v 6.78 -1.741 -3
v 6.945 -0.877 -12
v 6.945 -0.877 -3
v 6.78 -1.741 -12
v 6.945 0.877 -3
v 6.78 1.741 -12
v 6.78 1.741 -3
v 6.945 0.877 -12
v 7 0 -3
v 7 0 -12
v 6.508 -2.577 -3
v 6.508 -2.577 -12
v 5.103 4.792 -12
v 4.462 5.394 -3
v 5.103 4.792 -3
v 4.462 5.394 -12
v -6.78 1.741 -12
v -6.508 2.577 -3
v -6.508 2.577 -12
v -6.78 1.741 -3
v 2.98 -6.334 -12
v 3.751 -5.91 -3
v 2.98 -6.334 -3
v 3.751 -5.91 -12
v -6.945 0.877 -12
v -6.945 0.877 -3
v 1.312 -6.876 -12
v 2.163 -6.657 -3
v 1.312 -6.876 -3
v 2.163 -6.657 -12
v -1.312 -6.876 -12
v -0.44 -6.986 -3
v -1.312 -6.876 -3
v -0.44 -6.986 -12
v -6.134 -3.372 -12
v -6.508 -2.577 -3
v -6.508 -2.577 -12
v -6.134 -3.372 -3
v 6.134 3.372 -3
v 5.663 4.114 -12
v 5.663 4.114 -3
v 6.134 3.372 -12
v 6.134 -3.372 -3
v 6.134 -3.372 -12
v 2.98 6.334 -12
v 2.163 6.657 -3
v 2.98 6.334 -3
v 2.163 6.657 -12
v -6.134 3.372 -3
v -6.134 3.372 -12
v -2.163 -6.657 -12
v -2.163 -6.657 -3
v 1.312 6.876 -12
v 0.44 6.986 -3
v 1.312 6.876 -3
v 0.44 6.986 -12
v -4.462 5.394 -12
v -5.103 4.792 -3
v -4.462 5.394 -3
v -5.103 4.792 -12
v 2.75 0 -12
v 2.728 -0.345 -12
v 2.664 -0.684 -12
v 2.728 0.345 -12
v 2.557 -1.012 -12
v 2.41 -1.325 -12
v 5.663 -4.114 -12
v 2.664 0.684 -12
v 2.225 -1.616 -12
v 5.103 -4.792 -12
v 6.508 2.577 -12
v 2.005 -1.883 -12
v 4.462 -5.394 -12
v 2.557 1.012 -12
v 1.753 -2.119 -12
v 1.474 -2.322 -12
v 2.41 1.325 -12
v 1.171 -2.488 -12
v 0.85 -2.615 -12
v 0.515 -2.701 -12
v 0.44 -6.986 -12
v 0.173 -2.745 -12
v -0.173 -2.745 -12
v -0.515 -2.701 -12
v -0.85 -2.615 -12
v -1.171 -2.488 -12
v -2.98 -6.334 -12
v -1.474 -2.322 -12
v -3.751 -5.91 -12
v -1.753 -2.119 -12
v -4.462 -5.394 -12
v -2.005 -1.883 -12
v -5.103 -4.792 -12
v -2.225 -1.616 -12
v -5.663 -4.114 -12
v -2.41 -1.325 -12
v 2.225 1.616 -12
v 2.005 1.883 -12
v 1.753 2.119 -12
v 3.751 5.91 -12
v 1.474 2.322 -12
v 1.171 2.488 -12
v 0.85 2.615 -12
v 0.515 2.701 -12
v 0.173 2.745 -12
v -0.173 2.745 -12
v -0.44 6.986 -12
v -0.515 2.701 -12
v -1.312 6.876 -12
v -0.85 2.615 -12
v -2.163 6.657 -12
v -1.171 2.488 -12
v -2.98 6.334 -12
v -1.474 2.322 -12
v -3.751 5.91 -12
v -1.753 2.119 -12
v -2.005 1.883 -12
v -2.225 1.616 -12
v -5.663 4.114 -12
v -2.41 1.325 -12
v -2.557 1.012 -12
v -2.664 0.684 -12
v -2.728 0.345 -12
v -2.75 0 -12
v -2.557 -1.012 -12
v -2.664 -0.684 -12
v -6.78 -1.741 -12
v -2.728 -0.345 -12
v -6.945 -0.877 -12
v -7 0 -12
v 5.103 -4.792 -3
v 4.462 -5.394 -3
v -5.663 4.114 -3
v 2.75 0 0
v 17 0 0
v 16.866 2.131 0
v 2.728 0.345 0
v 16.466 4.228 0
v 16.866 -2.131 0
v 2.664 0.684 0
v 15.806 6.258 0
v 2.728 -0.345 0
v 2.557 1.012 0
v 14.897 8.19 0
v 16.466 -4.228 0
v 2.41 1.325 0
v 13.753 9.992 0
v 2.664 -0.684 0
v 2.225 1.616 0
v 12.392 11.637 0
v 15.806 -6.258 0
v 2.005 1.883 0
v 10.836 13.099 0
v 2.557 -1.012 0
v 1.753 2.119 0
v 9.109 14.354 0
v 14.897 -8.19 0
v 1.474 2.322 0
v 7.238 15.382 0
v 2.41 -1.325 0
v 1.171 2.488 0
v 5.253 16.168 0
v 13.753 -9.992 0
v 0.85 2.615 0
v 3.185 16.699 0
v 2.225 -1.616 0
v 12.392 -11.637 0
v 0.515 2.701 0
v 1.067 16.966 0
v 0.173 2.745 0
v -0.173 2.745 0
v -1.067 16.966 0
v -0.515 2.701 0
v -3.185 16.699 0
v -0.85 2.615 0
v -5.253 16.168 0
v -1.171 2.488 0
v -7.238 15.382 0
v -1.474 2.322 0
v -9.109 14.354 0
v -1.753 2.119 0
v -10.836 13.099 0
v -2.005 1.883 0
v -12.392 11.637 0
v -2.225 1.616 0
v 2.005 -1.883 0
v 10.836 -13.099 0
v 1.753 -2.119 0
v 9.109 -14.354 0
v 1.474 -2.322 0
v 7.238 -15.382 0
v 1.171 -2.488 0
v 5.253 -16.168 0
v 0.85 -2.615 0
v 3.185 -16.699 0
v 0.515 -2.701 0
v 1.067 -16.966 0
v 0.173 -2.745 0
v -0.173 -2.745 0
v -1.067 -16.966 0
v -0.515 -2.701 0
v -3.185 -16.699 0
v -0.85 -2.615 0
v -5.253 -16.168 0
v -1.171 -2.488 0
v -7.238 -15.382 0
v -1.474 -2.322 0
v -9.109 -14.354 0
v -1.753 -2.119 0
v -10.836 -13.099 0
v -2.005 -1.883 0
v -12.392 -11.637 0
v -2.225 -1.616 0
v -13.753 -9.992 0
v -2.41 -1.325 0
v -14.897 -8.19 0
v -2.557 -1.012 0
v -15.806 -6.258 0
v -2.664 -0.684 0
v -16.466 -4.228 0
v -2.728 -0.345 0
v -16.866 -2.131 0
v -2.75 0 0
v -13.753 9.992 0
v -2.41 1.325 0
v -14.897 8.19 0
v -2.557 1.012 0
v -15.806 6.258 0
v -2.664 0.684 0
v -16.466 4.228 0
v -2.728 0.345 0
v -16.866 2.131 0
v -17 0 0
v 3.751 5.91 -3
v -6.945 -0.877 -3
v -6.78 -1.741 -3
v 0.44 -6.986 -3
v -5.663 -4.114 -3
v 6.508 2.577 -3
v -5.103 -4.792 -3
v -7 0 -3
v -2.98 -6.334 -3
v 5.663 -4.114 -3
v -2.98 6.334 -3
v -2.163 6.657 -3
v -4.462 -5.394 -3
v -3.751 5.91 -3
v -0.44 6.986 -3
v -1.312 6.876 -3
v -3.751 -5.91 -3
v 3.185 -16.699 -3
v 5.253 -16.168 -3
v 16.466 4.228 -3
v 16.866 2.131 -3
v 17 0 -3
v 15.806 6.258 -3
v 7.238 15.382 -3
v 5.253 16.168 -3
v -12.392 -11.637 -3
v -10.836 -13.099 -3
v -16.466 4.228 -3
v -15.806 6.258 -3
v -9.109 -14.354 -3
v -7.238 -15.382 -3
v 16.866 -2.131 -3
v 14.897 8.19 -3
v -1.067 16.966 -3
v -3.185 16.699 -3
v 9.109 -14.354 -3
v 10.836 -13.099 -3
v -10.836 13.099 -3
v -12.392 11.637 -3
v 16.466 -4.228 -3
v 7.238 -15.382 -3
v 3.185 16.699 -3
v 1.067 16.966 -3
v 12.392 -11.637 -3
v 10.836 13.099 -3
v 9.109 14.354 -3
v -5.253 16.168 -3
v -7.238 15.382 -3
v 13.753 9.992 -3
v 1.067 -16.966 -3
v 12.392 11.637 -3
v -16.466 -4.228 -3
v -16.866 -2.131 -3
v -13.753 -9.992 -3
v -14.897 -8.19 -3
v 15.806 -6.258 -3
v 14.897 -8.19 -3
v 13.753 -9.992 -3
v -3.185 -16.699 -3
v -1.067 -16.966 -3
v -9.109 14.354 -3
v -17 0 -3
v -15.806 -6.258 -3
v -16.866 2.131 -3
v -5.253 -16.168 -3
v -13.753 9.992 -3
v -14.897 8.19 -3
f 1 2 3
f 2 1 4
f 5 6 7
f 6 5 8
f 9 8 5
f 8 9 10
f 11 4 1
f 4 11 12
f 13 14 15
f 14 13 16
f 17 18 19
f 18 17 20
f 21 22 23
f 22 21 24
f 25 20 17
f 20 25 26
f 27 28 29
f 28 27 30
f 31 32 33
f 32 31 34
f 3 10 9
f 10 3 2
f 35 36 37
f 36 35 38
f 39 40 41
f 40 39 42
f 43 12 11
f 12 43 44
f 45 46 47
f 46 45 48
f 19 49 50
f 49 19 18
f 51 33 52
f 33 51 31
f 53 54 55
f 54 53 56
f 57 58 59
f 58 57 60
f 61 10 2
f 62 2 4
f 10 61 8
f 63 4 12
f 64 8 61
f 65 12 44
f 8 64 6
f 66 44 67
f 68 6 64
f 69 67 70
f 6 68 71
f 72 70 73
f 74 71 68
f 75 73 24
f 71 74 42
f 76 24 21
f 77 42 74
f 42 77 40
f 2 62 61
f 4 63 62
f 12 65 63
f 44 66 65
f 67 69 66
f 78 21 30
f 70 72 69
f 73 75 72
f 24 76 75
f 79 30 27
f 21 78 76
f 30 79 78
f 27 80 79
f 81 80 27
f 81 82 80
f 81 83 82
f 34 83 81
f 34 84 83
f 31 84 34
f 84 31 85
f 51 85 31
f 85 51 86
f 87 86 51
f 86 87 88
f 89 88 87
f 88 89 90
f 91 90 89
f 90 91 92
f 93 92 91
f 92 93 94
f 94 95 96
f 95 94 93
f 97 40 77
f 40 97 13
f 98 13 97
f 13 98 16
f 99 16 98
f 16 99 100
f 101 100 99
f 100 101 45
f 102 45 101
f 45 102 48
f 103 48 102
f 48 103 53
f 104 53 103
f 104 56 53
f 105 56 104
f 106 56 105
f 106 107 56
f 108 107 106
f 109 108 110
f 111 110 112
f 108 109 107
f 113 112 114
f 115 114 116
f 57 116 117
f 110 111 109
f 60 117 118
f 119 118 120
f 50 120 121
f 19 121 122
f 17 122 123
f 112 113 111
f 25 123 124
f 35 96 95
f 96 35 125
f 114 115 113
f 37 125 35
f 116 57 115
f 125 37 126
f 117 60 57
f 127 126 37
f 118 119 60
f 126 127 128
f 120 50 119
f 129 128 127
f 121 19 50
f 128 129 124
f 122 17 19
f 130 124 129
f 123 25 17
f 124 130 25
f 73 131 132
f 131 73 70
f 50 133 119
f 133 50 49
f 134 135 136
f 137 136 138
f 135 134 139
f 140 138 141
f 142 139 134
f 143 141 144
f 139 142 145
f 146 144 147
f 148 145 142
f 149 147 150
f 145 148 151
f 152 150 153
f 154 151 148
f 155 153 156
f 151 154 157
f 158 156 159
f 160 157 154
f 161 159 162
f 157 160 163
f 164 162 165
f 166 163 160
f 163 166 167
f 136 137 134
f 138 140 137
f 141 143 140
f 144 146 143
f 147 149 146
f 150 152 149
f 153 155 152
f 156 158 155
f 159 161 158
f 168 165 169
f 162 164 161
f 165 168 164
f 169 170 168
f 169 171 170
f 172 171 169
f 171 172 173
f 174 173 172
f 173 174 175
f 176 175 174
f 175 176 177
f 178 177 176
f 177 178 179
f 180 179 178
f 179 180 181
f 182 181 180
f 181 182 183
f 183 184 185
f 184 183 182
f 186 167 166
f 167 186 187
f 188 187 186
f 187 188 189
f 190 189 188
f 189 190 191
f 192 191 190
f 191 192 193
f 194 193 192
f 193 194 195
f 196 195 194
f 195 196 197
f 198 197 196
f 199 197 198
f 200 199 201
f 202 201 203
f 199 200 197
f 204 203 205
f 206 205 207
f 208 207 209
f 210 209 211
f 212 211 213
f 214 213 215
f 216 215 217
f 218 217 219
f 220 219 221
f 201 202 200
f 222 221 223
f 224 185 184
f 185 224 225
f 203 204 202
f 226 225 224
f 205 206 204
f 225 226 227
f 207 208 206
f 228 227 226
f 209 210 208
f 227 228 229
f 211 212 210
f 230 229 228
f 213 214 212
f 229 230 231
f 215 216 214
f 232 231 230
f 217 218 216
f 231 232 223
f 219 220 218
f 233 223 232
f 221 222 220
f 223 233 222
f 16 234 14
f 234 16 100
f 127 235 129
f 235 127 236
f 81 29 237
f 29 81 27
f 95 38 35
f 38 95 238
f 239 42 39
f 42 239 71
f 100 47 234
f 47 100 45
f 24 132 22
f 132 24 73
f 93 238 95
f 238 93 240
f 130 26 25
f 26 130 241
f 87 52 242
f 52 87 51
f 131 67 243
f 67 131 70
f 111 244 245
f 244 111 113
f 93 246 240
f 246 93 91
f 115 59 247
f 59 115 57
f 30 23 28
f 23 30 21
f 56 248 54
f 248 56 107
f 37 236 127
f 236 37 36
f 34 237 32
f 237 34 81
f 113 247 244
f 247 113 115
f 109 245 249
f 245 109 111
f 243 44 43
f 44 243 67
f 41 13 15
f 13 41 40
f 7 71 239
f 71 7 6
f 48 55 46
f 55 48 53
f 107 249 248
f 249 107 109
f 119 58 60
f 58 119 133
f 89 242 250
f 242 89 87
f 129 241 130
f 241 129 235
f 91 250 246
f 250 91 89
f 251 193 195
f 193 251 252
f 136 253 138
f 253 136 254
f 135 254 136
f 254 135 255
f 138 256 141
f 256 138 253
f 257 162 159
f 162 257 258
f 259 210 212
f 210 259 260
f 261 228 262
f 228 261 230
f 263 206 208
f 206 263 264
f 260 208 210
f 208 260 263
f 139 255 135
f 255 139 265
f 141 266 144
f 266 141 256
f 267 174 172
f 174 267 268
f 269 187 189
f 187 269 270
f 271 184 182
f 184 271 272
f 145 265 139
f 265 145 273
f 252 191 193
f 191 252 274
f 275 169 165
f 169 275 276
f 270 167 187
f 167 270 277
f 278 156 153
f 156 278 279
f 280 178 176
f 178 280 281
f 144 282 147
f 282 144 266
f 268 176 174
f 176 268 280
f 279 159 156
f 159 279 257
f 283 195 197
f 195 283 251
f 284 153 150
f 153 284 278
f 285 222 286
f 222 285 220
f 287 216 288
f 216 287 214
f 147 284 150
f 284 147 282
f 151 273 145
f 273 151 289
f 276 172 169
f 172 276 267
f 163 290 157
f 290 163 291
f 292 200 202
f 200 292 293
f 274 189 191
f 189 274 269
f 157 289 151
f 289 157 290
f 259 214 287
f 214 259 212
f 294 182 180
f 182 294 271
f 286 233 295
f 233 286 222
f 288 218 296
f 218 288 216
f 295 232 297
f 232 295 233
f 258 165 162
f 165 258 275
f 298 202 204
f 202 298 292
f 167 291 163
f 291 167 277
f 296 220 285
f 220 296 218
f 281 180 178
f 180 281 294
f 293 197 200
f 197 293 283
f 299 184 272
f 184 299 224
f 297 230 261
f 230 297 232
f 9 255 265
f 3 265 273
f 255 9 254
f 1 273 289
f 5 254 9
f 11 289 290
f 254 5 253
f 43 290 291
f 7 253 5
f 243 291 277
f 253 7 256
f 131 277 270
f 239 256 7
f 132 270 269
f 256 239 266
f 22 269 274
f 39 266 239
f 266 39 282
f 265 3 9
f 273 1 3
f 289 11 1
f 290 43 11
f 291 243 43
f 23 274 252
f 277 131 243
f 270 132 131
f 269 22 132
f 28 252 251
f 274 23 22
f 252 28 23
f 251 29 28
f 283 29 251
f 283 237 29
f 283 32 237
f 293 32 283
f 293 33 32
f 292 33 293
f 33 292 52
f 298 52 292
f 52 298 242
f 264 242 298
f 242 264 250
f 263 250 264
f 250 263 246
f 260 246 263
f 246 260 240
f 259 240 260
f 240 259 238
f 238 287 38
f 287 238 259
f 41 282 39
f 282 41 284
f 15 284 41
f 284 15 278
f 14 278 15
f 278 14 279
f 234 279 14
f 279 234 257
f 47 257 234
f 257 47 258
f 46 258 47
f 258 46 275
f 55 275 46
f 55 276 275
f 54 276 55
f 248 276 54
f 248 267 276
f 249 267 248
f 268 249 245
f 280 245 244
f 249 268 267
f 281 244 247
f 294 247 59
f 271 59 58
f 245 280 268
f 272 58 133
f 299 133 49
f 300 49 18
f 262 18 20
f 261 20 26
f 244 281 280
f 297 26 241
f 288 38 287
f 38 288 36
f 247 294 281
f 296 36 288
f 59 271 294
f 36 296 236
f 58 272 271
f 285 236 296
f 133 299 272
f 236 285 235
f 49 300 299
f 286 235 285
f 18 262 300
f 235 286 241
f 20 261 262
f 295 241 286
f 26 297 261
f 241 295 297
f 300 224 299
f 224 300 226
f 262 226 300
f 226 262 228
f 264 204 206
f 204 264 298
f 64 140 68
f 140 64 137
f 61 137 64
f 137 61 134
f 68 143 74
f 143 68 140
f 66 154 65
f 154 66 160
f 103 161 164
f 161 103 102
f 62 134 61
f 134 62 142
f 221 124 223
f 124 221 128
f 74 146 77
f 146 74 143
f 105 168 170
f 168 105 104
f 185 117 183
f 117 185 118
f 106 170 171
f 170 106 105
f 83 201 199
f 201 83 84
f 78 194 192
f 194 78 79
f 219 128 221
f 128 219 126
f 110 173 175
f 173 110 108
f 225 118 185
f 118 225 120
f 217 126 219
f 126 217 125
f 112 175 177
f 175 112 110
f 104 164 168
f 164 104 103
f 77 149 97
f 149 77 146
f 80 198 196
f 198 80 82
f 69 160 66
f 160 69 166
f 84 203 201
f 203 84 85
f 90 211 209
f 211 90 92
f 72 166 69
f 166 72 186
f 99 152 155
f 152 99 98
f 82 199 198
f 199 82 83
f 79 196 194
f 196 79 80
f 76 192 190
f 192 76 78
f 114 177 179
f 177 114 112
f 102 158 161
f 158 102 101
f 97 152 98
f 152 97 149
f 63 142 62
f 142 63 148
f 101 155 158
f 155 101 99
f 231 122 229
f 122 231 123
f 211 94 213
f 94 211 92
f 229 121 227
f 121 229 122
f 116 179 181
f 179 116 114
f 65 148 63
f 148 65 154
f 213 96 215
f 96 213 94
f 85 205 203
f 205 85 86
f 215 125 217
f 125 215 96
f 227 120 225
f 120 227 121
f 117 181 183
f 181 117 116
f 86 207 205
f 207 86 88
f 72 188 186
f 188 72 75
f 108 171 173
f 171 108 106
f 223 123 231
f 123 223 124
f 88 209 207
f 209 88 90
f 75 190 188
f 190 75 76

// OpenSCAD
$fn = 50;


difference() {
	union() {
		translate(v = [0, 0, -12.0000000000]) {
			cylinder(h = 12, r = 7.0000000000);
		}
		translate(v = [0, 0, -3.0000000000]) {
			cylinder(h = 3, r = 17.0000000000);
		}
	}
	union() {
		#translate(v = [0, 0, -12]) {
			cylinder(h = 12, r = 2.7500000000);
		}
	}
}
